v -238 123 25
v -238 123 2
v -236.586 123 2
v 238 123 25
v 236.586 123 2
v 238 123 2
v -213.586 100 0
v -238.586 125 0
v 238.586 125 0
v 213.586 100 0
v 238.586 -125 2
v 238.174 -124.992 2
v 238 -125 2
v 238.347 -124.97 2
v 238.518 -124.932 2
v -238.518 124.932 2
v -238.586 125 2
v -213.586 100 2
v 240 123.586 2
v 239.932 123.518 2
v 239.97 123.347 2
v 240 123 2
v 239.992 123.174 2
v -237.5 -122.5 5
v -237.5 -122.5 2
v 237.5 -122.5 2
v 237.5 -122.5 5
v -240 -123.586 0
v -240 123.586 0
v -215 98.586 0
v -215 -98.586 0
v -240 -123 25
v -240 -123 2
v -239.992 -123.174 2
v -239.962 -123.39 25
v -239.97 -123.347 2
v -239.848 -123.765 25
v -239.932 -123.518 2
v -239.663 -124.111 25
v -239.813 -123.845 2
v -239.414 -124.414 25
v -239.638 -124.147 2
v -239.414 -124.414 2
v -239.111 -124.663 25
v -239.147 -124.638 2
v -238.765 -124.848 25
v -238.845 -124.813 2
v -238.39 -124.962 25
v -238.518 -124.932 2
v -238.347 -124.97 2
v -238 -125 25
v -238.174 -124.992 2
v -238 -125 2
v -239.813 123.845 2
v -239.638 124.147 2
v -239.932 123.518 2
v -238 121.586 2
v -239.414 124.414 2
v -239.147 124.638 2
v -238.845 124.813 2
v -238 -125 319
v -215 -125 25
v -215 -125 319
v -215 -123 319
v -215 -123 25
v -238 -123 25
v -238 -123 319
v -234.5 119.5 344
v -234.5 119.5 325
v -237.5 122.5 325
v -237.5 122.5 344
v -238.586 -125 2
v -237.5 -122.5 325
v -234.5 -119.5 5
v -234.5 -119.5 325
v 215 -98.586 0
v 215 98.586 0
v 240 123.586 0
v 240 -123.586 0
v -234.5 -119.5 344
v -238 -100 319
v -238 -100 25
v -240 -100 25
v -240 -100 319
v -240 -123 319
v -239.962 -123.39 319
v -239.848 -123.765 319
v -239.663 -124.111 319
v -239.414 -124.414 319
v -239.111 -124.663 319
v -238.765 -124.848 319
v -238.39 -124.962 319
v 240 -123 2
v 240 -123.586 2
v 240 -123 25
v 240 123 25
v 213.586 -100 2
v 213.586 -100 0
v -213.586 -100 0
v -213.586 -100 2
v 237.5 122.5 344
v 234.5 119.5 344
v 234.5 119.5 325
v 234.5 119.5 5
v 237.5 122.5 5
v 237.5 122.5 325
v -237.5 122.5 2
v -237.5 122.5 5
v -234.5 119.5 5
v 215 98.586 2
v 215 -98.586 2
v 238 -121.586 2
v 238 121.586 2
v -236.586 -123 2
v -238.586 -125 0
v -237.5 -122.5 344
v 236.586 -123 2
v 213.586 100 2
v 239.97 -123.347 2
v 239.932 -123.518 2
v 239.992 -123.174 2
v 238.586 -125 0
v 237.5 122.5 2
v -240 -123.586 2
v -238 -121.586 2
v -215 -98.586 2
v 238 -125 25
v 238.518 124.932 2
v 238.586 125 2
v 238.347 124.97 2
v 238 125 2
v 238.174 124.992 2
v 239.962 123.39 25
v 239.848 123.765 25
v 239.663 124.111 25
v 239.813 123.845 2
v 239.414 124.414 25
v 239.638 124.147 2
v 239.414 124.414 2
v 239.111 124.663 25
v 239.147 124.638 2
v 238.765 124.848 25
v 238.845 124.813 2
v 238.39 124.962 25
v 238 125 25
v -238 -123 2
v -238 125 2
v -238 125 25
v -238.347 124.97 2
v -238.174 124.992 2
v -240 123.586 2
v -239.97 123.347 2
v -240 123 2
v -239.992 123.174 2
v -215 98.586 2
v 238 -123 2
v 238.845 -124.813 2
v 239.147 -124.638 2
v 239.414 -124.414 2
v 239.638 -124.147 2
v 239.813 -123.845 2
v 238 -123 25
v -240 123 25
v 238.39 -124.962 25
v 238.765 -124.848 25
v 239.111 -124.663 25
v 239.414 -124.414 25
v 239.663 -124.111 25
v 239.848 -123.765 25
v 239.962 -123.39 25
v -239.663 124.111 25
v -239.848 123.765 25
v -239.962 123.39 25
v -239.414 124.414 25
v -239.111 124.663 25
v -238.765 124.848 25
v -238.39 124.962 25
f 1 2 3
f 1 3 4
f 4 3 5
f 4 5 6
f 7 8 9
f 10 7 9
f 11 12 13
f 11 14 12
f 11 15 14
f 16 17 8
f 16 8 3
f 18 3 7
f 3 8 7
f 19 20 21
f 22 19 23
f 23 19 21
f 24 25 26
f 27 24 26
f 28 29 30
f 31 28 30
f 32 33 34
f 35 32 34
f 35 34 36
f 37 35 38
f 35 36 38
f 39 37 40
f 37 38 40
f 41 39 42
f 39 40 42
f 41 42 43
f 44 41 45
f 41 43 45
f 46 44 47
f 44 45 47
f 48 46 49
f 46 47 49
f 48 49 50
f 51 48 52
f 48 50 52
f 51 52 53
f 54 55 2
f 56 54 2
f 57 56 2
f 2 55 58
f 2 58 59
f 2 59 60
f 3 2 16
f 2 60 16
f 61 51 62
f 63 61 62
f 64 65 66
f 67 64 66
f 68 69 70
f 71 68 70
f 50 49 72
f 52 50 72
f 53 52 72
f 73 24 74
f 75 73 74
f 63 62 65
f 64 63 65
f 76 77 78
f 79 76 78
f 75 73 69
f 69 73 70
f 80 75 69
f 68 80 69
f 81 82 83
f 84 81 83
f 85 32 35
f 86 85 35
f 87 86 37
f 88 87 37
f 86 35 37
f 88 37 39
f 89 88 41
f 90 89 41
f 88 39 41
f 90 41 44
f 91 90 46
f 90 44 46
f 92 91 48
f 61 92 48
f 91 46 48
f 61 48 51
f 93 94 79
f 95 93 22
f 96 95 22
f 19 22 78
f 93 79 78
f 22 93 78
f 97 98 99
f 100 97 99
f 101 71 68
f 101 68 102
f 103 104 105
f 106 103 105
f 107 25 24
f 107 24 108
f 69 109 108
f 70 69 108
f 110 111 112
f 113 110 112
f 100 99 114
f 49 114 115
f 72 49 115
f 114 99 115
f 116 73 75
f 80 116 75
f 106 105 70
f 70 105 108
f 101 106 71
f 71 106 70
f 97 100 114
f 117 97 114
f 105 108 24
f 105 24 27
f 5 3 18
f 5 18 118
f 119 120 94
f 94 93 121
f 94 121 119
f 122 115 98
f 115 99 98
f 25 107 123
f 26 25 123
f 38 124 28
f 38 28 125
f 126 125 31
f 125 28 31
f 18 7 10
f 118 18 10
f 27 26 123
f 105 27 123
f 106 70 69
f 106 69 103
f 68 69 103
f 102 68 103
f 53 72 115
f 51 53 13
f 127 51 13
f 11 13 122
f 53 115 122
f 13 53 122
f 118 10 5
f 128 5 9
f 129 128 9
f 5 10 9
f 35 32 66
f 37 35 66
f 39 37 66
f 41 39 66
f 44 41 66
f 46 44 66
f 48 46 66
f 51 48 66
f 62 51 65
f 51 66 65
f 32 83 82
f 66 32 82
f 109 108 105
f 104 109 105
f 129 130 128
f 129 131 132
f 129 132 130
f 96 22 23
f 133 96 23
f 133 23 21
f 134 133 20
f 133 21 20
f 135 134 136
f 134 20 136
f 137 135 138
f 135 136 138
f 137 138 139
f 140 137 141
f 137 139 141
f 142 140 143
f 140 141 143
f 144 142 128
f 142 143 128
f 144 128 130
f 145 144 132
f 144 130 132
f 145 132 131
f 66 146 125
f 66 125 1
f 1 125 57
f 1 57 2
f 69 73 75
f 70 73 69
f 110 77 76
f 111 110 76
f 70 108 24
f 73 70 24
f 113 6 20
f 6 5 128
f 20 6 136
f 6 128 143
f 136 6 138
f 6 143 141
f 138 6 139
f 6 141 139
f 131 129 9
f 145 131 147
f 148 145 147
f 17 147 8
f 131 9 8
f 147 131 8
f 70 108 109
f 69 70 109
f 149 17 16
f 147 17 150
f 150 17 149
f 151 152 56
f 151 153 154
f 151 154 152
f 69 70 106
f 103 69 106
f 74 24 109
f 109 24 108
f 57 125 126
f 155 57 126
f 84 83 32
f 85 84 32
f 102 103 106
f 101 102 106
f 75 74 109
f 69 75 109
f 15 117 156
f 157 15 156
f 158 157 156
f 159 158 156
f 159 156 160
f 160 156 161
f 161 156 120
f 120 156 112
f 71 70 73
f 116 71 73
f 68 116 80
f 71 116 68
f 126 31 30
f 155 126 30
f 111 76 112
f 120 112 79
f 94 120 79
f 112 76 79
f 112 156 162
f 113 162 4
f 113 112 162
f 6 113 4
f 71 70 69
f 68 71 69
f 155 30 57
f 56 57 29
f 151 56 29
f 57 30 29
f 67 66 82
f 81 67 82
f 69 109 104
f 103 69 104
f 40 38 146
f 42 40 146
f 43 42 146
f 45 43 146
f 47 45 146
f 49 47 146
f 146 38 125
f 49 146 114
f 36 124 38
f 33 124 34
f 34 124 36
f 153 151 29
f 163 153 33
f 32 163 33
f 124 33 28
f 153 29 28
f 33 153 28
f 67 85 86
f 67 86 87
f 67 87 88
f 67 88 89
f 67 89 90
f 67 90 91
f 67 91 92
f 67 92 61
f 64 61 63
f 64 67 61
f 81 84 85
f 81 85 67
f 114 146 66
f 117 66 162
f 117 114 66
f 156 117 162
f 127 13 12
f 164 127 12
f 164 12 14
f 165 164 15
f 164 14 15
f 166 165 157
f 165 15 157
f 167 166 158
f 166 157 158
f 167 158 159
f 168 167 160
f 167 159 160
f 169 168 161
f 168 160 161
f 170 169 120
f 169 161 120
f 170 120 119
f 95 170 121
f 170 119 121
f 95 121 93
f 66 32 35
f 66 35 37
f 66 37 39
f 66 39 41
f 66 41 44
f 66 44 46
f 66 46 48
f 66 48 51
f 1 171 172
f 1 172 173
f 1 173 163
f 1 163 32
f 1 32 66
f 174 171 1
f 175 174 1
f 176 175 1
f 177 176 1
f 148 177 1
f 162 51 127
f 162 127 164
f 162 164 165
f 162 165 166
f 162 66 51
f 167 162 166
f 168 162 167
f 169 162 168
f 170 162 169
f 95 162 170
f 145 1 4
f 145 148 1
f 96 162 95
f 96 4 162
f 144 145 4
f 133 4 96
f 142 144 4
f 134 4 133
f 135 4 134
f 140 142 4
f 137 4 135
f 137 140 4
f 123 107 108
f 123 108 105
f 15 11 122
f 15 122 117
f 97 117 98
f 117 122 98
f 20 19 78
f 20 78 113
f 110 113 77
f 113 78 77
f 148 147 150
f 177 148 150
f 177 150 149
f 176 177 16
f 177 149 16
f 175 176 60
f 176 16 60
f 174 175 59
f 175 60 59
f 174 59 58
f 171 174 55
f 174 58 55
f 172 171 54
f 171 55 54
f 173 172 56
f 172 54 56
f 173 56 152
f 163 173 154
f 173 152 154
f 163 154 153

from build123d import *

# Parameters (mm, degrees)
F1_DEPTH  = 2
F3_W      = 476
F3_H      = 246
F4_DEPTH  = 23
F5_W      = 475
F5_H      = 245
F6_DEPTH  = 3
F7_DEPTH  = 25
F10_DEPTH = 320
F12_DEPTH = 320
F14_DEPTH = 294
F16_DEPTH = 19
F18_DEPTH = 19


with BuildPart() as f1:
    # F0 (on Top) → F1 (new body)
    with BuildSketch(Plane.XY):
        Polygon((238.585786, 125), (-238.585786, 125), (-213.585786, 100), (213.585786, 100), align=None)
        Polygon((240, -123.585786), (240, 123.585786), (215, 98.585786), (215, -98.585786), align=None)
        Polygon((-238.585786, -125), (238.585786, -125), (213.585786, -100), (-213.585786, -100), align=None)
        Polygon((-240, 123.585786), (-240, -123.585786), (-215, -98.585786), (-215, 98.585786), align=None)
    extrude(amount=F1_DEPTH)

    # F3 (on face) → F4 (join)
    with BuildSketch(Plane.XY.offset(2)):
        with BuildLine():
            Line((238, 125), (-238, 125))
            ThreePointArc((-238, 125), (-239.414214, 124.414214), (-240, 123))
            Line((-240, 123), (-240, -123))
            ThreePointArc((-240, -123), (-239.414214, -124.414214), (-238, -125))
            Line((-238, -125), (238, -125))
            ThreePointArc((238, -125), (239.414214, -124.414214), (240, -123))
            Line((240, -123), (240, 123))
            ThreePointArc((240, 123), (239.414214, 124.414214), (238, 125))
        make_face()
        Rectangle(F3_W, F3_H, mode=Mode.SUBTRACT)
    extrude(amount=F4_DEPTH)


with BuildPart() as f6:
    # F5 (on face) → F6 (new body)
    with BuildSketch(Plane.XY.offset(2)):
        Rectangle(F5_W, F5_H)
    extrude(amount=F6_DEPTH)


with BuildPart() as f7:
    # F3 (on face) → F7 (new body)
    with BuildSketch(Plane.XY.offset(2)):
        with BuildLine():
            Line((238, 125), (-238, 125))
            ThreePointArc((-238, 125), (-239.414214, 124.414214), (-240, 123))
            Line((-240, 123), (-240, -123))
            ThreePointArc((-240, -123), (-239.414214, -124.414214), (-238, -125))
            Line((-238, -125), (238, -125))
            ThreePointArc((238, -125), (239.414214, -124.414214), (240, -123))
            Line((240, -123), (240, 123))
            ThreePointArc((240, 123), (239.414214, 124.414214), (238, 125))
        make_face()
        Rectangle(F3_W, F3_H, mode=Mode.SUBTRACT)
    extrude(amount=F7_DEPTH)


with BuildPart() as f10:
    # F9 (on face) → F10 (new body)
    with BuildSketch(Plane.XY.offset(5)):
        Polygon((237.5, 122.5), (-237.5, 122.5), (-234.5, 119.5), (234.5, 119.5), align=None)
    extrude(amount=F10_DEPTH)


with BuildPart() as f12:
    # F11 (on face) → F12 (new body, through all)
    with BuildSketch(Plane.XY.offset(5)):
        Polygon((-234.5, 119.5), (-237.5, 122.5), (-237.5, -122.5), (-234.5, -119.5), align=None)
    extrude(amount=F12_DEPTH)


with BuildPart() as f14:
    # F13 (on face) → F14 (new body)
    with BuildSketch(Plane.XY.offset(25)):
        with BuildLine():
            Line((-240, -100), (-240, -123))
            ThreePointArc((-240, -123), (-239.414214, -124.414214), (-238, -125))
            Line((-238, -125), (-215, -125))
            Line((-215, -125), (-215, -123))
            Line((-215, -123), (-238, -123))
            Line((-238, -123), (-238, -100))
            Line((-238, -100), (-240, -100))
        make_face()
    extrude(amount=F14_DEPTH)


with BuildPart() as f16:
    # F15 (on face) → F16 (new body)
    with BuildSketch(Plane.XY.offset(325)):
        Polygon((234.5, 119.5), (237.5, 122.5), (-237.5, 122.5), (-234.5, 119.5), align=None)
    extrude(amount=F16_DEPTH)


with BuildPart() as f18:
    # F17 (on face) → F18 (new body)
    with BuildSketch(Plane.XY.offset(325)):
        Polygon((-234.5, -119.5), (-234.5, 119.5), (-237.5, 122.5), (-237.5, -122.5), align=None)
    extrude(amount=F18_DEPTH)


solid = Compound([f1.part, f6.part, f10.part, f12.part, f14.part, f16.part, f18.part])
